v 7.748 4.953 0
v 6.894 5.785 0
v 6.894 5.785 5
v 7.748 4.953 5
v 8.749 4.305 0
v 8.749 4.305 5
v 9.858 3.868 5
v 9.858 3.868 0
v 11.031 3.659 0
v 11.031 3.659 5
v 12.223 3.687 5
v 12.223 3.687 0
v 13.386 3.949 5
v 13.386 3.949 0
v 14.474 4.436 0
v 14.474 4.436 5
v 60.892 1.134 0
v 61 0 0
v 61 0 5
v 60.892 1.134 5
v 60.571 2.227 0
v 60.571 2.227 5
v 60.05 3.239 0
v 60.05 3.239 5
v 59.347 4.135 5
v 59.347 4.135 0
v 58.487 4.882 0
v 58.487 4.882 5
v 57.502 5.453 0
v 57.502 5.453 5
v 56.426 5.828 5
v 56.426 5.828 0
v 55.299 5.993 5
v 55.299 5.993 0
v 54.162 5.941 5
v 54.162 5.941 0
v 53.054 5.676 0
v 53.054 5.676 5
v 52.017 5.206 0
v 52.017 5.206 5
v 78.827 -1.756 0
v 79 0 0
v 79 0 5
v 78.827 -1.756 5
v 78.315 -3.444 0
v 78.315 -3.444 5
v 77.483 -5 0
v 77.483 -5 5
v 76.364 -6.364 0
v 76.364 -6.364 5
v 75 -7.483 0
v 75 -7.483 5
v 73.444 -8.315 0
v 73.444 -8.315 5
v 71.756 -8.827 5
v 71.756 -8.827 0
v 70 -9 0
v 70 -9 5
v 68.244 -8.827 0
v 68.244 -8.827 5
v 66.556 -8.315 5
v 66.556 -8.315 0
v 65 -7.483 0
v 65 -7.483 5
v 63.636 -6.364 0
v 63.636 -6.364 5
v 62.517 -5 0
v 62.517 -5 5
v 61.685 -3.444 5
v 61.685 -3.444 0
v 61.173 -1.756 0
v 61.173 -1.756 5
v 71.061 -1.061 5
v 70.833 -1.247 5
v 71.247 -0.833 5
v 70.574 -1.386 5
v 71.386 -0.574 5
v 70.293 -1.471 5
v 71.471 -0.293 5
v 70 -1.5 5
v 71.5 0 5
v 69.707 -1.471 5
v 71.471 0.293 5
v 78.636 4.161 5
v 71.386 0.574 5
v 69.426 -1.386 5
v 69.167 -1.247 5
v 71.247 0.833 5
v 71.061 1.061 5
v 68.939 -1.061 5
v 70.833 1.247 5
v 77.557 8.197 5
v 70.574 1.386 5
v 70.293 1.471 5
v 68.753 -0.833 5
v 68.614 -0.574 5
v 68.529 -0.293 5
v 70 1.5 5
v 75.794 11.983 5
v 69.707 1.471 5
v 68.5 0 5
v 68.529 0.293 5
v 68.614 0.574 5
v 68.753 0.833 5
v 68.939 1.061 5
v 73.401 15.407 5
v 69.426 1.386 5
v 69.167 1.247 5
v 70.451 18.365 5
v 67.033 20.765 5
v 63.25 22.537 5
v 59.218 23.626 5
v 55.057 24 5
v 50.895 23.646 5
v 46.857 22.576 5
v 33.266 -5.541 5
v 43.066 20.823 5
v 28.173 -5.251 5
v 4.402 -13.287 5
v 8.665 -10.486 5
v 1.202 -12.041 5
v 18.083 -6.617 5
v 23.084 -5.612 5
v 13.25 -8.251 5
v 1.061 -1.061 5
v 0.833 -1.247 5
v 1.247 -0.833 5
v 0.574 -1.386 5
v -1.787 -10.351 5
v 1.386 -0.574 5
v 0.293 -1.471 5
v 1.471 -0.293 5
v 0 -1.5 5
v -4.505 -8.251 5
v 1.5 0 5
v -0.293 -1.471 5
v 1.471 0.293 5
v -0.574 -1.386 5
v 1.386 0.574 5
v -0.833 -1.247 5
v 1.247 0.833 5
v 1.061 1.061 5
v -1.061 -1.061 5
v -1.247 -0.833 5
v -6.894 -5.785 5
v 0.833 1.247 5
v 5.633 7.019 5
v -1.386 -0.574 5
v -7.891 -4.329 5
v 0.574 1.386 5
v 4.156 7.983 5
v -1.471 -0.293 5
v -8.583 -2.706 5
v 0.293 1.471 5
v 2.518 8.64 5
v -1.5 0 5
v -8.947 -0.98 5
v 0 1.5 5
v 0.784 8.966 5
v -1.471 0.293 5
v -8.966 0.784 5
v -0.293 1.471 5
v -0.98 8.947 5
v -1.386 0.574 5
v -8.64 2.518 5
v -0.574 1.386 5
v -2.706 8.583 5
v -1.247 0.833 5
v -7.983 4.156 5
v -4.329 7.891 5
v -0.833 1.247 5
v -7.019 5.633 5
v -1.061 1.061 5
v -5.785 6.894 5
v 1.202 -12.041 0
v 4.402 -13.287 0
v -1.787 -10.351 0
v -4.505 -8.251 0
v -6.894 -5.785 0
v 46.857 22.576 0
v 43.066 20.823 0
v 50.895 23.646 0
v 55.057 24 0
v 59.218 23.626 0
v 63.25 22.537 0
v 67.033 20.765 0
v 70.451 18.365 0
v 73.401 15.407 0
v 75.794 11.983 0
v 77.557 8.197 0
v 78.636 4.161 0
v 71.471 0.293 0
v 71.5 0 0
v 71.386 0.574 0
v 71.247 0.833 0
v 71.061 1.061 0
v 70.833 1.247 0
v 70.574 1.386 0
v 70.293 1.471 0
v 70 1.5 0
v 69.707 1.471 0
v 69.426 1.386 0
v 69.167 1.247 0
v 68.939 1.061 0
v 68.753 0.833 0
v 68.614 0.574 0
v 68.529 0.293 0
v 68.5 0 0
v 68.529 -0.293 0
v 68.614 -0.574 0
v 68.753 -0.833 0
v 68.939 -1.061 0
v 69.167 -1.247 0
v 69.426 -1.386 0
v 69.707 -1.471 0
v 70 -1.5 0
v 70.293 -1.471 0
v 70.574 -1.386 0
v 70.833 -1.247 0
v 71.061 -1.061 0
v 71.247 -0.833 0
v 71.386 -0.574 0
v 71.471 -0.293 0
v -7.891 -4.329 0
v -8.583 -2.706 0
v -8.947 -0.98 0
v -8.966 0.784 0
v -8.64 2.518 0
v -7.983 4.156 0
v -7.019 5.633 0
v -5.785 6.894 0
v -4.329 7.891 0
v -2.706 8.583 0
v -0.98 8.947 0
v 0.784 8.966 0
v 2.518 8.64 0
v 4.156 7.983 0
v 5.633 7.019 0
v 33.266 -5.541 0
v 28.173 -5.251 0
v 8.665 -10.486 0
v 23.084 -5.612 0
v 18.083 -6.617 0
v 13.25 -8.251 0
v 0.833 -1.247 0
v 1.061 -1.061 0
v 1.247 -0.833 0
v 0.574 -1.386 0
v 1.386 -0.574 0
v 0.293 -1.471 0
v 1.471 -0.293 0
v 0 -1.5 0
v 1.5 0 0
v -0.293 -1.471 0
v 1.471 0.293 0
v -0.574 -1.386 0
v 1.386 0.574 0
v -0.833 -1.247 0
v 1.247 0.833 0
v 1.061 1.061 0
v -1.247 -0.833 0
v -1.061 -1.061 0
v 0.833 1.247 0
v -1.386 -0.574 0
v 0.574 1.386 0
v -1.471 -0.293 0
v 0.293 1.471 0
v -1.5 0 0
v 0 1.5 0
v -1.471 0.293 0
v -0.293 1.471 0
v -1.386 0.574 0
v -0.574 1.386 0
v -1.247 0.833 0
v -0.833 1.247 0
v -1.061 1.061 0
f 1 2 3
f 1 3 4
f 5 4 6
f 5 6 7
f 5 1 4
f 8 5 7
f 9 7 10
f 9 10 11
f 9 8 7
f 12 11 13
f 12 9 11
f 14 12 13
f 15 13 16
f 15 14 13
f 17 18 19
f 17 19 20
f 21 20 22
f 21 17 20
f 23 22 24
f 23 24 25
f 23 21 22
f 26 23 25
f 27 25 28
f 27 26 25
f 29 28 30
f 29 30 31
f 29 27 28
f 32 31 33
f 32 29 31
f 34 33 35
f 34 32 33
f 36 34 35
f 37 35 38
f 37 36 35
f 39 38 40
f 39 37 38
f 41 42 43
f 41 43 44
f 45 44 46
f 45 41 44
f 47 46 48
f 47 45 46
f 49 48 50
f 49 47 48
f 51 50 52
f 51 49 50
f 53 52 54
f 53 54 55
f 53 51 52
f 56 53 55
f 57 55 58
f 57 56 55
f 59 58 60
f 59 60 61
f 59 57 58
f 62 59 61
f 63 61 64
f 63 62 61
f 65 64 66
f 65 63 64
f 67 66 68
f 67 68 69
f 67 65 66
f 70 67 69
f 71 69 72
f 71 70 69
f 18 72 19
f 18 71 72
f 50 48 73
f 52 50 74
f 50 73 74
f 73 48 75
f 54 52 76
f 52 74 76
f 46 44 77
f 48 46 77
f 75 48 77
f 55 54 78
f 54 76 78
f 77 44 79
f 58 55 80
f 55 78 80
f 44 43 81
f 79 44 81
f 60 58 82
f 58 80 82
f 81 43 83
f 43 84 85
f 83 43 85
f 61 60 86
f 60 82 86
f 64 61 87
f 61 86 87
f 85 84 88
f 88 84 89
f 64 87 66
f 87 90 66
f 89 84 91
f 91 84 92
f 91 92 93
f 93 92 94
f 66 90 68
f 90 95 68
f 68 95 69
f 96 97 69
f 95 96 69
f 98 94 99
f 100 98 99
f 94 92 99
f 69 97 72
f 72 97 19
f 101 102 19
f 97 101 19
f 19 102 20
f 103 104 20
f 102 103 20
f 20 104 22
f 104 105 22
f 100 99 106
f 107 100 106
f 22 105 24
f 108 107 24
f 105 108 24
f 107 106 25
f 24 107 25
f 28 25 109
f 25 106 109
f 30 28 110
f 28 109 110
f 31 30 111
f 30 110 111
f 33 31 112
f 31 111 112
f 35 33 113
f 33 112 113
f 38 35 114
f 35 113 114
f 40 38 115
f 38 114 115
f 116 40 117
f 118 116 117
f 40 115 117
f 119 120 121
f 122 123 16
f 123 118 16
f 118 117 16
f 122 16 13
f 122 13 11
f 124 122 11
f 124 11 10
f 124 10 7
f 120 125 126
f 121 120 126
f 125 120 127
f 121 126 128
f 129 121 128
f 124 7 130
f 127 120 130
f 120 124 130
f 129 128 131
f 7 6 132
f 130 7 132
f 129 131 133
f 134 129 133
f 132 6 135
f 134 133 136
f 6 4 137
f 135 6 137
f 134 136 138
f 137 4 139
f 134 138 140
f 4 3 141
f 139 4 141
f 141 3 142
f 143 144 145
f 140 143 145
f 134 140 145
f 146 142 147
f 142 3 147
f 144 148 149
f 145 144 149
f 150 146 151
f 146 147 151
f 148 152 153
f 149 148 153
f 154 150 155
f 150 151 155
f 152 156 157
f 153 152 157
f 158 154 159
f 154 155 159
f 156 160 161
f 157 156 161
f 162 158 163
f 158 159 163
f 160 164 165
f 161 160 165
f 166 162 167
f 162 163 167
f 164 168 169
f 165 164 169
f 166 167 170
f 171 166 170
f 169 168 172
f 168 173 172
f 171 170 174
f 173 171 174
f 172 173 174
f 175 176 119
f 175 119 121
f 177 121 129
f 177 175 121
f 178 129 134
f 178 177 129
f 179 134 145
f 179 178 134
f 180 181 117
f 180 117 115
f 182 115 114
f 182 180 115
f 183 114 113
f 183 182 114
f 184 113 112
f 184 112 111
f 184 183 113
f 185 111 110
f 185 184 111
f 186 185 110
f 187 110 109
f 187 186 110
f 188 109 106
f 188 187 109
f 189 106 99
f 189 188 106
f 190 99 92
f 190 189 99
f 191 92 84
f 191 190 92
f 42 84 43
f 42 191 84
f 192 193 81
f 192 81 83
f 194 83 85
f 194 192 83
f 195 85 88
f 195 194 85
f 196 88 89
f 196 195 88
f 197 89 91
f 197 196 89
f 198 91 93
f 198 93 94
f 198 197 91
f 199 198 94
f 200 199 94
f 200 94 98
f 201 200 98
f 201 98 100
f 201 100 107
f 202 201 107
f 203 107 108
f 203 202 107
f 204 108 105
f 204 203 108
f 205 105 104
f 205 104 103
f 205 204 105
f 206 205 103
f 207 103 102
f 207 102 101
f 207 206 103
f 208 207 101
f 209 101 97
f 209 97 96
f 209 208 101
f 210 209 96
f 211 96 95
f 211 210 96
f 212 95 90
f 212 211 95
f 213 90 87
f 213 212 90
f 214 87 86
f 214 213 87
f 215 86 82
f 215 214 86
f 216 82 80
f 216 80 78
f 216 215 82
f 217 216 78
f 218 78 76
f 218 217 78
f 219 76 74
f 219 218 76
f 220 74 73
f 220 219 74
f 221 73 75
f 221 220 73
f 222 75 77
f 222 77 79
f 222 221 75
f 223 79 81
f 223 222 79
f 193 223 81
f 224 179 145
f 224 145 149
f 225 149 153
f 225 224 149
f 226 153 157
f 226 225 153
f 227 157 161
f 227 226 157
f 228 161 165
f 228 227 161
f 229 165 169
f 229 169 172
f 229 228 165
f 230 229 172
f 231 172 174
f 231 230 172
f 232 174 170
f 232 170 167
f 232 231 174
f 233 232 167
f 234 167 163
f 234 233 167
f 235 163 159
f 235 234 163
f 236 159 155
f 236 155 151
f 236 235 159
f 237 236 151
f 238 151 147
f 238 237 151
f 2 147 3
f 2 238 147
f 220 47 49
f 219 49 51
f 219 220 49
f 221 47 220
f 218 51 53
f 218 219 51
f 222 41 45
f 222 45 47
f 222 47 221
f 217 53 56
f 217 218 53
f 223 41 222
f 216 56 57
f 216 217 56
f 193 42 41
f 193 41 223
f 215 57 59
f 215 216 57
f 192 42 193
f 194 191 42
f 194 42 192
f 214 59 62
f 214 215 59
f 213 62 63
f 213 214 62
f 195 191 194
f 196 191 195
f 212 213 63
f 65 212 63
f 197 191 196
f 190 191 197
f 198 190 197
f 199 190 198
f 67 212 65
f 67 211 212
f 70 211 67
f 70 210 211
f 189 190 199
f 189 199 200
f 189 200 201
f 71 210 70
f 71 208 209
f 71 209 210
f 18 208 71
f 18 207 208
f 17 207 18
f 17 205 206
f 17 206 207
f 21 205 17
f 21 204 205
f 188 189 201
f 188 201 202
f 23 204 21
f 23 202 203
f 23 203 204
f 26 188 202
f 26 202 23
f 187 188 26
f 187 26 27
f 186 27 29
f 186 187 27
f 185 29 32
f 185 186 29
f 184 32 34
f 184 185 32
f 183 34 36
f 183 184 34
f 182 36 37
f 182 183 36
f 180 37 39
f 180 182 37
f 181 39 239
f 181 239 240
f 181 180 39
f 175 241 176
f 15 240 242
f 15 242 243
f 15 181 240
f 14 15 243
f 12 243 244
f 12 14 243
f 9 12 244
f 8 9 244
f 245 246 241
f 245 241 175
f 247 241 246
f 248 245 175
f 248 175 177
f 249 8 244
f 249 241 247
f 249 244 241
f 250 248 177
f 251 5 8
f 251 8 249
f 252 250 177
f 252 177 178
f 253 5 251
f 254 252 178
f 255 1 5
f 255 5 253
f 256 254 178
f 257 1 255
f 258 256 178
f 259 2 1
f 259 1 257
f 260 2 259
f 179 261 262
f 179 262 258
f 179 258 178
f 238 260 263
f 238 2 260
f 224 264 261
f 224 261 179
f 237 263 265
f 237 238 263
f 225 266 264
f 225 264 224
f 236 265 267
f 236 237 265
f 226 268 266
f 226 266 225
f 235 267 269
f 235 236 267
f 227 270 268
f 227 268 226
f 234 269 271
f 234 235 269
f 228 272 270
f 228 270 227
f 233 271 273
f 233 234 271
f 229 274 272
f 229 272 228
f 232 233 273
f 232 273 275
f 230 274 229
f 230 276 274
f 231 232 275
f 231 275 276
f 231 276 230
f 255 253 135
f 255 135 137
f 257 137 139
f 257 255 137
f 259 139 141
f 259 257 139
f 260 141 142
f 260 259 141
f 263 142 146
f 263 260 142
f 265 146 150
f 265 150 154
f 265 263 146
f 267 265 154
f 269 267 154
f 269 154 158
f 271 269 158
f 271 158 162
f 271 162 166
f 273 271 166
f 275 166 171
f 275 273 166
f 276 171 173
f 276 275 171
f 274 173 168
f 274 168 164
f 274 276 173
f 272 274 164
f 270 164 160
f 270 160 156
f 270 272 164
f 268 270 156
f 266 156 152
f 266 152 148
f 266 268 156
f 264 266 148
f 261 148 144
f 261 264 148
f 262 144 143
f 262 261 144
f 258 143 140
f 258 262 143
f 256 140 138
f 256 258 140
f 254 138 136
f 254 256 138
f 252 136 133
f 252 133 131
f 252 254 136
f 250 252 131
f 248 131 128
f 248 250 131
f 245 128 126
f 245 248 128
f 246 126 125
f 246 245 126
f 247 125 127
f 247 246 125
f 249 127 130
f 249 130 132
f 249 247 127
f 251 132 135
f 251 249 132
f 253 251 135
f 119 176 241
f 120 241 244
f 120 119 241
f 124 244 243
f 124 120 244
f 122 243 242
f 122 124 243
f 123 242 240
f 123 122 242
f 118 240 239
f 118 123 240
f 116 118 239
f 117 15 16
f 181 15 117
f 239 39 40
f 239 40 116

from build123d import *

# Parameters (mm, degrees)
ESQUISSE1_R             = 1.5
BOSS_EXTRU_1_DEPTH      = 5
ENL_V_MAT_EXTRU_1_DEPTH = 10


with BuildPart() as part:
    # Esquisse1 → Boss.-Extru.1 (new body)
    with BuildSketch(Plane.XY):
        with BuildLine():
            Line((14.474115402, 4.43614094), (43.066204977, 20.822692822))
            ThreePointArc((43.066204977, 20.822692822), (67.033056957, 20.765489165), (79, 0))
            ThreePointArc((79, 0), (70, -9), (61, 0))
            ThreePointArc((61, 0), (58.008264239, 5.191372291), (52.016551244, 5.205673206))
            Line((52.016551244, 5.205673206), (23.424461669, -11.180878677))
            ThreePointArc((23.424461669, -11.180878677), (7.285507399, -13.986910655), (-6.894399988, -5.785088487))
            ThreePointArc((-6.894399988, -5.785088487), (-5.785088487, 6.894399988), (6.894399988, 5.785088487))
            ThreePointArc((6.894399988, 5.785088487), (10.439376835, 3.734632945), (14.474115402, 4.43614094))
        make_face()
        with Locations((70, 0)):
            Circle(ESQUISSE1_R, mode=Mode.SUBTRACT)
        Circle(ESQUISSE1_R, mode=Mode.SUBTRACT)
    extrude(amount=BOSS_EXTRU_1_DEPTH)

    # Esquisse2 → Enlèv. mat.-Extru.1 (cut)
    with BuildSketch(Plane.XY.offset(5)):
        with BuildLine():
            ThreePointArc((4.401541671, -13.287300689), (18.082976377, -6.617066031), (33.265702076, -5.540717398))
            ThreePointArc((33.265702076, -5.540717398), (20.118574556, -14.201807608), (4.401541671, -13.287300689))
        make_face()
    extrude(amount=-ENL_V_MAT_EXTRU_1_DEPTH, mode=Mode.SUBTRACT)


solid = part.part
